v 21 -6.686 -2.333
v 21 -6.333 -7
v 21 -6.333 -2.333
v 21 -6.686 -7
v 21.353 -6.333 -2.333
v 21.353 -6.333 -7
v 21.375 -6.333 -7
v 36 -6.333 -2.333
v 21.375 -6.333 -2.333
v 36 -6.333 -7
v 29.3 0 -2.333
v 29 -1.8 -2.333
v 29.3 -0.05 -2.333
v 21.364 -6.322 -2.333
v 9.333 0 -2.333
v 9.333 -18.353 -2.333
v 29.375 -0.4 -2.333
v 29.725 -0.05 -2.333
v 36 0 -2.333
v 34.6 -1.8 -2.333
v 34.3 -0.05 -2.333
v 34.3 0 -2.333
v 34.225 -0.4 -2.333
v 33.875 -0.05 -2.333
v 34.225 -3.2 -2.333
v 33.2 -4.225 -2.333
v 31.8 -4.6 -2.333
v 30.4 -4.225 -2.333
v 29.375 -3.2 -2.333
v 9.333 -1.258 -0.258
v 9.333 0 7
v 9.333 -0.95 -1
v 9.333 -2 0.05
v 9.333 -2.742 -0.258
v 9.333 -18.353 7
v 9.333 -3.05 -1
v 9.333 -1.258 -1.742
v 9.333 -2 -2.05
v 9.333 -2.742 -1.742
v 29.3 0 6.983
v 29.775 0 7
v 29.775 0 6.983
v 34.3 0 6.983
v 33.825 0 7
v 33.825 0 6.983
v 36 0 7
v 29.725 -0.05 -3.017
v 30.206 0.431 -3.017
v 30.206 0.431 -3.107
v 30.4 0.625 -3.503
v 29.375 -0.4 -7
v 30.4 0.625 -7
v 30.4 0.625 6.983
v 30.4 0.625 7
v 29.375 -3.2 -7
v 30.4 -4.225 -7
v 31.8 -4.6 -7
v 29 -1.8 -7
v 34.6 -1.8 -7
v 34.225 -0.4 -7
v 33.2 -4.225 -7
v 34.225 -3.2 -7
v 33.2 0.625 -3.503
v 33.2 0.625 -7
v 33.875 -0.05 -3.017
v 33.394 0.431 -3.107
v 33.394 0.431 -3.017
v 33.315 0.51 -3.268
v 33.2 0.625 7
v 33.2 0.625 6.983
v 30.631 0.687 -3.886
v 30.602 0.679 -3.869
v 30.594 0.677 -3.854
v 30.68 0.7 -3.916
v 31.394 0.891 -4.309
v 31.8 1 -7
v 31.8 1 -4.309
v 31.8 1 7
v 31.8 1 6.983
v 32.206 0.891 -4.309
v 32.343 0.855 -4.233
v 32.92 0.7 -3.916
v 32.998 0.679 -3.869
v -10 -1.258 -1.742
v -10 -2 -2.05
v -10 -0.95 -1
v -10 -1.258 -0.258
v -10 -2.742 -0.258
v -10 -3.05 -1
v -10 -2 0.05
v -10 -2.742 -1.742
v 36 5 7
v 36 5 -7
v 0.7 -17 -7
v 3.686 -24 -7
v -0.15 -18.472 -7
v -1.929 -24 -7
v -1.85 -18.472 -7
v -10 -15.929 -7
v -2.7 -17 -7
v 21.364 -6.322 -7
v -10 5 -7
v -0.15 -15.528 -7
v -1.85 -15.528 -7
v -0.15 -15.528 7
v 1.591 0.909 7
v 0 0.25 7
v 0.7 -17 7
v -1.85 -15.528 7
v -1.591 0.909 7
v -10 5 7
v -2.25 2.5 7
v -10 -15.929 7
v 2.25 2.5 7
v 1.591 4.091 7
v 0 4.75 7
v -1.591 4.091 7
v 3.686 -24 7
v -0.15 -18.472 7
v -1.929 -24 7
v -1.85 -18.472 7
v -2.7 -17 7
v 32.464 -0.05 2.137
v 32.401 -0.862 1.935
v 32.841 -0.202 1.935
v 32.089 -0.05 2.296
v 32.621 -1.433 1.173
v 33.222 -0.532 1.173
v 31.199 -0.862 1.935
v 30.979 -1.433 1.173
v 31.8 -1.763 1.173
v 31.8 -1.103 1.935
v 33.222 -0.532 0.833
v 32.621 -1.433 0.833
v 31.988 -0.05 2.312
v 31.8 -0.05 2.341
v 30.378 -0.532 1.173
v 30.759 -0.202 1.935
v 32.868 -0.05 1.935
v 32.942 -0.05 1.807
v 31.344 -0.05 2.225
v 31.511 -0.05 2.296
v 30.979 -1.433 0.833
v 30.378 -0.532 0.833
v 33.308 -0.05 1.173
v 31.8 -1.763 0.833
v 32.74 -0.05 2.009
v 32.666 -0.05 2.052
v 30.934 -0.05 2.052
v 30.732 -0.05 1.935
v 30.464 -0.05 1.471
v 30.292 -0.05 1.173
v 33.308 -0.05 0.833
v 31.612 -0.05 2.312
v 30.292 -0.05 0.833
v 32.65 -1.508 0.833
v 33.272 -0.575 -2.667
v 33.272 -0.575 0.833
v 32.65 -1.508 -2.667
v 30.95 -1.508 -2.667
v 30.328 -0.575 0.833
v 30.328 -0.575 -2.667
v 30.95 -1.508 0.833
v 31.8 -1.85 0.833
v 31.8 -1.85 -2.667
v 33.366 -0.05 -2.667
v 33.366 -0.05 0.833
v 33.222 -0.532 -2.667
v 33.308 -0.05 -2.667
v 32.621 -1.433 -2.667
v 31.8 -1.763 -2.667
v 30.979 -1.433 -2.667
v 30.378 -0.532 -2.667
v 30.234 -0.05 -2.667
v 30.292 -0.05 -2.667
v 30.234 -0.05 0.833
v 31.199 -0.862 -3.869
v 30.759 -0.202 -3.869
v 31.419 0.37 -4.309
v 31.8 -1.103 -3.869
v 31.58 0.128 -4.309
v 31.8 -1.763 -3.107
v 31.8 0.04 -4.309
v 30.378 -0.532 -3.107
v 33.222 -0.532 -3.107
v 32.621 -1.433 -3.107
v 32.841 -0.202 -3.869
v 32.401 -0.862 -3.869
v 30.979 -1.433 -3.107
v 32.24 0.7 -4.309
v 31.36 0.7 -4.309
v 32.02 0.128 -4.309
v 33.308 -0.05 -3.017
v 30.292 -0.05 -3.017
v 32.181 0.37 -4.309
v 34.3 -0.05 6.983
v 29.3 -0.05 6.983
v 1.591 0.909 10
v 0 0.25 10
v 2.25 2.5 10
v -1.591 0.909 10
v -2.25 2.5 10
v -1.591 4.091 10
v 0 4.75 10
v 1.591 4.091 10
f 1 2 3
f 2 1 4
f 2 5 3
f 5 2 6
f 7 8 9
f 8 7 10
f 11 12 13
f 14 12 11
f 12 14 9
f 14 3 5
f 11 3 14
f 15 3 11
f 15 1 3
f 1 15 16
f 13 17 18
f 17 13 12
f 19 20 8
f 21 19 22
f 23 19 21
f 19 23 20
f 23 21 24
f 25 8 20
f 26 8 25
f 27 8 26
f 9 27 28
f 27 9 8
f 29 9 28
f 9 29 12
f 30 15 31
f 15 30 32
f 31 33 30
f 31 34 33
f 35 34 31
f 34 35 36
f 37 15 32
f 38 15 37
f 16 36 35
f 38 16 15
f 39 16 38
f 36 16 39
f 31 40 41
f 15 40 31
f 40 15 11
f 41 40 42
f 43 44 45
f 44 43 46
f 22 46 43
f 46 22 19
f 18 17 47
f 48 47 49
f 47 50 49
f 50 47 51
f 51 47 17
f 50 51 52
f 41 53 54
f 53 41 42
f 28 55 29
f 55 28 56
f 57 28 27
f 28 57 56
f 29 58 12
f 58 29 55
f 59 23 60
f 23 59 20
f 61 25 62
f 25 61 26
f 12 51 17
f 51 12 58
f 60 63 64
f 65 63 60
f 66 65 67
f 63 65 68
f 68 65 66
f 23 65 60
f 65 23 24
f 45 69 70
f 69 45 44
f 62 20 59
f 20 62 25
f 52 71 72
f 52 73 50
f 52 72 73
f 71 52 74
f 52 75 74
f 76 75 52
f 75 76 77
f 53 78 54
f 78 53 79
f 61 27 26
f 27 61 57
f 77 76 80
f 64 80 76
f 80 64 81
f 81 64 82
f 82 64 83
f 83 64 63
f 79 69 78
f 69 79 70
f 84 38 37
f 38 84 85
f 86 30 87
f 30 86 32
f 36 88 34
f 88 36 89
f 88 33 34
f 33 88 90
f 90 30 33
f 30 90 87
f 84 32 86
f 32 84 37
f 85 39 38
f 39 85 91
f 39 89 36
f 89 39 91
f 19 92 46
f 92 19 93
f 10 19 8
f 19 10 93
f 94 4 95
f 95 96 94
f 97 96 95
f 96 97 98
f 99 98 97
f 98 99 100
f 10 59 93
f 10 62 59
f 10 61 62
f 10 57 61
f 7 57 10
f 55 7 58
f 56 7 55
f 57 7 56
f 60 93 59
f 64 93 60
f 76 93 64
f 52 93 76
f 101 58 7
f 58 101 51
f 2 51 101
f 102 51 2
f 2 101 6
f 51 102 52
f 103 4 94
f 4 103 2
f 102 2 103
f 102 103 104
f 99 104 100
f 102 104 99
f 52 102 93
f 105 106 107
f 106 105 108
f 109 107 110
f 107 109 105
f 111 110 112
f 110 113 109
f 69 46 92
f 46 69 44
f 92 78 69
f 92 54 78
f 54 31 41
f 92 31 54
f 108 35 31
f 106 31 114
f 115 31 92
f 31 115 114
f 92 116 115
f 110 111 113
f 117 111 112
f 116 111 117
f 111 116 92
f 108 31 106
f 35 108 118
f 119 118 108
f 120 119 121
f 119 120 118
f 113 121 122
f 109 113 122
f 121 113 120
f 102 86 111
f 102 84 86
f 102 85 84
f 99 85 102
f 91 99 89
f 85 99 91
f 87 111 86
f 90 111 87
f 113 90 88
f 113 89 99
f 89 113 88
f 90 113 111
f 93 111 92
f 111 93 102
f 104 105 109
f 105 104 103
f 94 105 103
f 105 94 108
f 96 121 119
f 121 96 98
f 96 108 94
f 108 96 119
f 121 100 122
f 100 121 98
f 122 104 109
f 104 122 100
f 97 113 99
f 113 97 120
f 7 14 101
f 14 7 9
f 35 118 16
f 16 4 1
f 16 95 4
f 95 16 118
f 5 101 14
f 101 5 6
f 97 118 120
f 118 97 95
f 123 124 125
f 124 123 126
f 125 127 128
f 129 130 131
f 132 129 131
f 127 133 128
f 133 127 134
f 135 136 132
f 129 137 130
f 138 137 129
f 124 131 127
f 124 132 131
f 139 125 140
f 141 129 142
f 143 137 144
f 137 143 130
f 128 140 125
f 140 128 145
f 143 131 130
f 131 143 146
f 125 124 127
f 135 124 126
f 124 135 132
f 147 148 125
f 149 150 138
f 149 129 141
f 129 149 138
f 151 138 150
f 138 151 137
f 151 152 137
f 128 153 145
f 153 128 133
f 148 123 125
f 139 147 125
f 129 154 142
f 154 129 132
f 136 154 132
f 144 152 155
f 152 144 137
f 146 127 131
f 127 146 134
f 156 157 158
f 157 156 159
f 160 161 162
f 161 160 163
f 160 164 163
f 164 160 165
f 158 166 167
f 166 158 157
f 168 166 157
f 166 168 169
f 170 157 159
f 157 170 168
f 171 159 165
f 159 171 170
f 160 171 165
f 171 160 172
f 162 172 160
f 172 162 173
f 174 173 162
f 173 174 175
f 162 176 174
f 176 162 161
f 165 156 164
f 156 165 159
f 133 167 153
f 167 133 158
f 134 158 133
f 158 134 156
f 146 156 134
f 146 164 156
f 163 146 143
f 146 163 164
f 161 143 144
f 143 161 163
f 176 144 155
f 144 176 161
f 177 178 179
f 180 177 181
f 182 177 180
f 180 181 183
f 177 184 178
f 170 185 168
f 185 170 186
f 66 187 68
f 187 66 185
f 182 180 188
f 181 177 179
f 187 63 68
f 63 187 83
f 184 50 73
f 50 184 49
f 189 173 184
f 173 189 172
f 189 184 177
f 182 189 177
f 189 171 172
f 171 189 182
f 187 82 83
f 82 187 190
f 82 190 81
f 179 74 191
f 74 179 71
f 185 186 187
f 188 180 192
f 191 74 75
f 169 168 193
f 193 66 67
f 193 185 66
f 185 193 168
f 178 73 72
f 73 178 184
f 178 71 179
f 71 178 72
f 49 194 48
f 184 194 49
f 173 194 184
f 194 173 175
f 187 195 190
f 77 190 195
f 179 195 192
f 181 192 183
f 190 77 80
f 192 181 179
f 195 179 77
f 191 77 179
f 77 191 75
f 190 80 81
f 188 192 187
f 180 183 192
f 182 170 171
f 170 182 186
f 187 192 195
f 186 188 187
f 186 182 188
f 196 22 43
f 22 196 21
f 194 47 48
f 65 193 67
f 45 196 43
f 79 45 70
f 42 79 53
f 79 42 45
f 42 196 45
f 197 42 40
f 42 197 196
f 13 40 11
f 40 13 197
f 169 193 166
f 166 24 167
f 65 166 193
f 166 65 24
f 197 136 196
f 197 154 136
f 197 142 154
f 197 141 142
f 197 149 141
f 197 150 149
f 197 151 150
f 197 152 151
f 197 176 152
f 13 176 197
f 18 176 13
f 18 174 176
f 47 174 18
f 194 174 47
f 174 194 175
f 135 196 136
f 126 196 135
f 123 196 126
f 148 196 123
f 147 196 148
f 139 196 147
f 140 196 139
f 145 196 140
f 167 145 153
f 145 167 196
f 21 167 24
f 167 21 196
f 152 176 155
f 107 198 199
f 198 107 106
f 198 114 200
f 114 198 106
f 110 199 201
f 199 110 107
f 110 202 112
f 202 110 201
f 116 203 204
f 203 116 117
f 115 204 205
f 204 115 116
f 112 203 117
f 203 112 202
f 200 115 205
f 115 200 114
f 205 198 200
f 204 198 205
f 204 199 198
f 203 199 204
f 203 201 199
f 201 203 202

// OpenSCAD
//
// Shapes to subtract
// 

// height in design space (thickness Z in printspace) reduced 12 -> 9
// wire hole reduced from r=1.5 to 1.3mm

nsp = 1.7; // pilot hole for #6 screw
nsh = 4;  // connection screw head recess
hradius = 1.3;

module hole(rad, hg) {
		rotate([0,0,0])
			cylinder(r=rad, h=hg,center=true);
}

module cavity(len,wid,hgt,t,gauge) {
//corner
	translate([len/2,1+wid/2,-1]) cube([8+len/2,2*wid/3,hgt+4],true);
//slot
	translate([len/3,3+wid/4,-2.5]) cube([len/2-2,6+wid/2,5+hgt/3],true);
//tube hole
	  translate([(len/2)-18.2,t/2-1,-hgt])
      rotate([0,0,90]) 
   cylinder(r=t/2,h=2*hgt,$fn=12);
//wire hole
      translate([-70,2,1])
       rotate([0,90,0]) 
        cylinder(r=gauge/2, h=3*len,$fn=8);
//      translate([-70,1.4,0])
//       rotate([0,90,0]) 
//        cylinder(r=(gauge/2)-0.1, h=3*len,$fn=6);

// connection screw recessed head
	//  translate([36-len/2,t/2-1.5,((2*hgt)/5)-1])
    //  rotate([0,0,90]) 
    //    cylinder(r=nsh,h=1+hgt,$fn=12);
// connection screw pilot hole
	  translate([36-len/2,t/2-1.5,0])
      rotate([0,0,90]) 
        cylinder(r=nsp,h=3+hgt,$fn=12);
// electrical wire cavity
		  translate([36-len/2,t/2+26,-3+hgt/3])
      rotate([90,0,0]) 
       cylinder(r=1.5,h=wid+2,$fn=6);
//cube([wid+2,3,3],true);
}
	// MOUNTING Holes
//	module mholes(ht) {
//	 translate([114.26,0,-3])
//	   hole(nsp, ht);
	module mholes(ht) {
	 translate([81.2,0,-3])
	   hole(nsp, ht);
// 	 translate([112,23,-3])
// 	   hole(nsp, ht);

//   translate([98.61, 0, -3])
//	   hole( hradius, thickplus);
//   translate([96.62, 19.23, -3])
//	   hole( nsp, ht);

//   translate([80.7, 15.85, -3])
//	   hole( nsp, ht);
   }


module compress(len,wid,hgt,t,gauge) {

   difference() {
		translate([13,11,0]) cube([len/2-4,wid,hgt],true);
		cavity(len,wid,hgt,t,gauge);
     translate([-1,17,0]) hole(nsp, 16);
     translate([-7,26,0])
        rotate([0,0,45])
            cube([24,10,hgt+2],center=true);
     translate([15,24,0])
        rotate([0,0,-45])
            cube([34,16,hgt+2],center=true);
     translate([0,30,0])
            cube([24,12,hgt+2],center=true);
	}

 	translate([(len/2)-18.2,-0.7,hgt/3-5.4])
      rotate([0,0,90]) 
        scale([1.5,1,1]) sphere(r=1.7,$fn=12); 
	translate([(len/2)-18.2,-0.7,hgt/3-5.5])
      rotate([0,0,90]) 
        scale([1.5,1,1]) cylinder(r=1.7,h=hgt/4,$fn=12);

	translate([(len/2)-18.2,-0.7,hgt/3-2])
      rotate([0,0,90]) 
        scale([1.5,1,1]) sphere(r=1.7,$fn=12); 
	translate([(len/2)-18.2,-2.45,hgt/3-6.65])
        cube([5,5,hgt-4],center=true); 
}

module piece() {
alpha = 7;    
   translate([0,-2.5,-7])
			cylinder(r=2.25,h=6,center=true,$fn=8);

    compress(100,32,14,5.6,2.1);	
// gauge was 2.15
}

rotate([180,0,0]) 
    piece();
